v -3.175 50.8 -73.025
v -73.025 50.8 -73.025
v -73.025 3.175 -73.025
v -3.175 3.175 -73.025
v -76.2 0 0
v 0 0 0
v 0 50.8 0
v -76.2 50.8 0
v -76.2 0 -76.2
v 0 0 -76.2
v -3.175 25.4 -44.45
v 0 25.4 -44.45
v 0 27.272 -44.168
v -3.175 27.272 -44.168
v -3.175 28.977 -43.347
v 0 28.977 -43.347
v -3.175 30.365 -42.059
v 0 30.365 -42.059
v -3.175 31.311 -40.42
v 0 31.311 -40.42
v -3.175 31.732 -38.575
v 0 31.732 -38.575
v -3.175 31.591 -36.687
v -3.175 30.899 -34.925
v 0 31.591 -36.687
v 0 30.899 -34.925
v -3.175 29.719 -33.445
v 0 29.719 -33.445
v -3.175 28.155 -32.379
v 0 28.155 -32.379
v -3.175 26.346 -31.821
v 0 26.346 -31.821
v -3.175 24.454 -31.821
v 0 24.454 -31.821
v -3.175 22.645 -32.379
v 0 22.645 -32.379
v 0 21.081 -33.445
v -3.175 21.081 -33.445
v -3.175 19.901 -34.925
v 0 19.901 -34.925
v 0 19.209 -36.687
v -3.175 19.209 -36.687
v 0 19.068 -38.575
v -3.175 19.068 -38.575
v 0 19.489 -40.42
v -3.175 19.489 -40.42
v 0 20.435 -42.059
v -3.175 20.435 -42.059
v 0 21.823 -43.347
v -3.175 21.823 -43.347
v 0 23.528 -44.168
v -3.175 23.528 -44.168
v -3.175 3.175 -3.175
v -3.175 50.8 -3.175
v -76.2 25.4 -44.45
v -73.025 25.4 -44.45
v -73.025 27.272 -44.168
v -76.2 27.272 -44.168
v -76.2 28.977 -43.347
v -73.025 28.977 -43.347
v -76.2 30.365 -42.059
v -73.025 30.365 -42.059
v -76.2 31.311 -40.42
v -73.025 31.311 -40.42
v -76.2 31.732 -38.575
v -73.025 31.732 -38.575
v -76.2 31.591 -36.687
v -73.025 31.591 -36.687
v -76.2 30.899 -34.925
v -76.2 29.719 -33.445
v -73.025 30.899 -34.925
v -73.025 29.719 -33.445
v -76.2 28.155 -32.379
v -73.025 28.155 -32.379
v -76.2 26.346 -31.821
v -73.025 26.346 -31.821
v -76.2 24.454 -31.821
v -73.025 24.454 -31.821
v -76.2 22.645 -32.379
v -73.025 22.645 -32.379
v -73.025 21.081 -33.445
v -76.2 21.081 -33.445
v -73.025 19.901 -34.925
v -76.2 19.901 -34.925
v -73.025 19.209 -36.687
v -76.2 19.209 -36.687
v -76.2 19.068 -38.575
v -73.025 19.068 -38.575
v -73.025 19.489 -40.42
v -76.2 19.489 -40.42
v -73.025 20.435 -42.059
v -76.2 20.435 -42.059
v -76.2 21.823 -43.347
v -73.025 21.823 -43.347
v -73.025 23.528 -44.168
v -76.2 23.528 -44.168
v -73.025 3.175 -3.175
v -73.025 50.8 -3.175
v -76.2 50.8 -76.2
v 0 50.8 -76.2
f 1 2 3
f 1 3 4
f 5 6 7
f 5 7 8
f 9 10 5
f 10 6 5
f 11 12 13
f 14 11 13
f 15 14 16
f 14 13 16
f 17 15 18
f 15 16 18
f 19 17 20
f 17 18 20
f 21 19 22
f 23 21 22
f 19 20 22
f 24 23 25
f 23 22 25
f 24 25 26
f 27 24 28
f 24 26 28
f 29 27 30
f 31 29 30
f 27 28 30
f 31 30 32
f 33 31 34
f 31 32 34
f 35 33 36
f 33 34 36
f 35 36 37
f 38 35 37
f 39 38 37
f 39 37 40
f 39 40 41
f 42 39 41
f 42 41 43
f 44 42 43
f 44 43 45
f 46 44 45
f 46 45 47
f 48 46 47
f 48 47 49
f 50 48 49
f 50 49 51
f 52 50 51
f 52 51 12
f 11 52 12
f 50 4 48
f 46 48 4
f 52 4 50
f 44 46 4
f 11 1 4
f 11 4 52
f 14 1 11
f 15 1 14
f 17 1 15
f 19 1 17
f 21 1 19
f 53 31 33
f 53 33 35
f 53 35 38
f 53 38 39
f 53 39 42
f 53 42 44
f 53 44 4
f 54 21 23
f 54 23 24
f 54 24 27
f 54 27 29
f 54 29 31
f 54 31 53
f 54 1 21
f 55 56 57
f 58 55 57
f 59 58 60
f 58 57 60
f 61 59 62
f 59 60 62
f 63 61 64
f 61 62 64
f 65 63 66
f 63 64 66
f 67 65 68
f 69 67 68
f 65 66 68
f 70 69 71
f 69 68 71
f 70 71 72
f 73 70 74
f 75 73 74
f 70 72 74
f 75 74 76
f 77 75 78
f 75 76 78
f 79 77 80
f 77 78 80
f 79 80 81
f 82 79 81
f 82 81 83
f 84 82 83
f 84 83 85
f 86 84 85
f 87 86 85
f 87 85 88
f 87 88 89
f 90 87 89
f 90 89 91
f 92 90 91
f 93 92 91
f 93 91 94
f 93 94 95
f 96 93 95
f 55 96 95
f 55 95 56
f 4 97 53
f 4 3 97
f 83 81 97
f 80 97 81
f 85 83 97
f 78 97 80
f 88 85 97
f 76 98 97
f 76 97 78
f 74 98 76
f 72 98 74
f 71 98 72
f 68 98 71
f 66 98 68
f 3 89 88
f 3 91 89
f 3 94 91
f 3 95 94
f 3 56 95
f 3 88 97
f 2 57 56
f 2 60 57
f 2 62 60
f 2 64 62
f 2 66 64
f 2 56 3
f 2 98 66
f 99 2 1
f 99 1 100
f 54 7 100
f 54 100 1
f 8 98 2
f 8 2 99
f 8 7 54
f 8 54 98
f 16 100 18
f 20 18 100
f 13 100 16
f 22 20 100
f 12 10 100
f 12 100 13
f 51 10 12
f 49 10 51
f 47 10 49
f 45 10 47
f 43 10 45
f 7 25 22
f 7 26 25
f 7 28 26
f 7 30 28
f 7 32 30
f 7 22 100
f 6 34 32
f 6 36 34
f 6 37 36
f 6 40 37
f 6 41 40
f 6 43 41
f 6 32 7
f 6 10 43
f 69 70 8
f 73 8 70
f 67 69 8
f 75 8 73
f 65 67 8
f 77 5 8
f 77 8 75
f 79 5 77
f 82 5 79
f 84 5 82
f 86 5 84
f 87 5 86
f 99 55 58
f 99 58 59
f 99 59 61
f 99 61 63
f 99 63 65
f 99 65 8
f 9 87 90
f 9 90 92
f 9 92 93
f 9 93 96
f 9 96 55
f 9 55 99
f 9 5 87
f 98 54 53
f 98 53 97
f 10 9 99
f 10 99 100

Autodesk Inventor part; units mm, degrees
ref_plane "YZ Plane" through (0, 0, 0) normal (1, 0, 0) x (0, 1, 0)
ref_plane "XZ Plane" through (0, 0, 0) normal (0, 1, 0) x (-1, 0, 0)
ref_plane "XY Plane" through (0, 0, 0) normal (0, 0, 1) x (1, 0, 0)
sketch "Sketch1" plane through (0, 0, 0) normal (0, 1, 0) x (-1, 0, 0)
  line L0 (0, 0) -> (76.2, 0)
  line L1 (76.2, 0) -> (76.2, -76.2)
  line L2 (76.2, -76.2) -> (0, -76.2)
  line L3 (0, -76.2) -> (0, 0)
  dimension "d0" = 76.2
  dimension "d1" = 76.2
extrude "Extrusion1" add sketch "Sketch1" along normal blind 50.8
sketch "Sketch2" plane through (0, 50.8, 0) normal (0, 1, 0) x (1, 0, 0)
  line L0 (0, 76.2) -> (-76.2, 76.2) projected
  line L1 (-76.2, 76.2) -> (-76.2, 0) projected
  line L2 (-76.2, 0) -> (0, 0) projected
  line L3 (0, 0) -> (0, 76.2) projected
  line L4 (-73.025, 73.025) -> (-3.175, 73.025)
  line L5 (-3.175, 73.025) -> (-3.175, 3.175)
  line L6 (-3.175, 3.175) -> (-73.025, 3.175)
  line L7 (-73.025, 3.175) -> (-73.025, 73.025)
  dimension "d4" = 3.175
  dimension "d5" = 3.175
  dimension "d6" = 3.175
  dimension "d7" = 3.175
extrude "Extrusion2" cut sketch "Sketch2" against normal blind 47.625 contours L4 L5 L6 L7
sketch "Sketch3" plane through (0, 0, 0) normal (1, 0, 0) x (0, 0, -1)
  line L0 (0, 0) -> (76.2, 0) projected
  line L1 (76.2, 0) -> (76.2, 50.8) projected
  line L2 (0, 50.8) -> (76.2, 50.8) projected
  line L3 (0, 0) -> (0, 50.8) projected
  circle A0 centre (38.1, 25.4) radius 6.35
  dimension "d10" = 12.7
extrude "Extrusion3" cut sketch "Sketch3" against normal through all contours A0
properties part number "FakeHousing"
